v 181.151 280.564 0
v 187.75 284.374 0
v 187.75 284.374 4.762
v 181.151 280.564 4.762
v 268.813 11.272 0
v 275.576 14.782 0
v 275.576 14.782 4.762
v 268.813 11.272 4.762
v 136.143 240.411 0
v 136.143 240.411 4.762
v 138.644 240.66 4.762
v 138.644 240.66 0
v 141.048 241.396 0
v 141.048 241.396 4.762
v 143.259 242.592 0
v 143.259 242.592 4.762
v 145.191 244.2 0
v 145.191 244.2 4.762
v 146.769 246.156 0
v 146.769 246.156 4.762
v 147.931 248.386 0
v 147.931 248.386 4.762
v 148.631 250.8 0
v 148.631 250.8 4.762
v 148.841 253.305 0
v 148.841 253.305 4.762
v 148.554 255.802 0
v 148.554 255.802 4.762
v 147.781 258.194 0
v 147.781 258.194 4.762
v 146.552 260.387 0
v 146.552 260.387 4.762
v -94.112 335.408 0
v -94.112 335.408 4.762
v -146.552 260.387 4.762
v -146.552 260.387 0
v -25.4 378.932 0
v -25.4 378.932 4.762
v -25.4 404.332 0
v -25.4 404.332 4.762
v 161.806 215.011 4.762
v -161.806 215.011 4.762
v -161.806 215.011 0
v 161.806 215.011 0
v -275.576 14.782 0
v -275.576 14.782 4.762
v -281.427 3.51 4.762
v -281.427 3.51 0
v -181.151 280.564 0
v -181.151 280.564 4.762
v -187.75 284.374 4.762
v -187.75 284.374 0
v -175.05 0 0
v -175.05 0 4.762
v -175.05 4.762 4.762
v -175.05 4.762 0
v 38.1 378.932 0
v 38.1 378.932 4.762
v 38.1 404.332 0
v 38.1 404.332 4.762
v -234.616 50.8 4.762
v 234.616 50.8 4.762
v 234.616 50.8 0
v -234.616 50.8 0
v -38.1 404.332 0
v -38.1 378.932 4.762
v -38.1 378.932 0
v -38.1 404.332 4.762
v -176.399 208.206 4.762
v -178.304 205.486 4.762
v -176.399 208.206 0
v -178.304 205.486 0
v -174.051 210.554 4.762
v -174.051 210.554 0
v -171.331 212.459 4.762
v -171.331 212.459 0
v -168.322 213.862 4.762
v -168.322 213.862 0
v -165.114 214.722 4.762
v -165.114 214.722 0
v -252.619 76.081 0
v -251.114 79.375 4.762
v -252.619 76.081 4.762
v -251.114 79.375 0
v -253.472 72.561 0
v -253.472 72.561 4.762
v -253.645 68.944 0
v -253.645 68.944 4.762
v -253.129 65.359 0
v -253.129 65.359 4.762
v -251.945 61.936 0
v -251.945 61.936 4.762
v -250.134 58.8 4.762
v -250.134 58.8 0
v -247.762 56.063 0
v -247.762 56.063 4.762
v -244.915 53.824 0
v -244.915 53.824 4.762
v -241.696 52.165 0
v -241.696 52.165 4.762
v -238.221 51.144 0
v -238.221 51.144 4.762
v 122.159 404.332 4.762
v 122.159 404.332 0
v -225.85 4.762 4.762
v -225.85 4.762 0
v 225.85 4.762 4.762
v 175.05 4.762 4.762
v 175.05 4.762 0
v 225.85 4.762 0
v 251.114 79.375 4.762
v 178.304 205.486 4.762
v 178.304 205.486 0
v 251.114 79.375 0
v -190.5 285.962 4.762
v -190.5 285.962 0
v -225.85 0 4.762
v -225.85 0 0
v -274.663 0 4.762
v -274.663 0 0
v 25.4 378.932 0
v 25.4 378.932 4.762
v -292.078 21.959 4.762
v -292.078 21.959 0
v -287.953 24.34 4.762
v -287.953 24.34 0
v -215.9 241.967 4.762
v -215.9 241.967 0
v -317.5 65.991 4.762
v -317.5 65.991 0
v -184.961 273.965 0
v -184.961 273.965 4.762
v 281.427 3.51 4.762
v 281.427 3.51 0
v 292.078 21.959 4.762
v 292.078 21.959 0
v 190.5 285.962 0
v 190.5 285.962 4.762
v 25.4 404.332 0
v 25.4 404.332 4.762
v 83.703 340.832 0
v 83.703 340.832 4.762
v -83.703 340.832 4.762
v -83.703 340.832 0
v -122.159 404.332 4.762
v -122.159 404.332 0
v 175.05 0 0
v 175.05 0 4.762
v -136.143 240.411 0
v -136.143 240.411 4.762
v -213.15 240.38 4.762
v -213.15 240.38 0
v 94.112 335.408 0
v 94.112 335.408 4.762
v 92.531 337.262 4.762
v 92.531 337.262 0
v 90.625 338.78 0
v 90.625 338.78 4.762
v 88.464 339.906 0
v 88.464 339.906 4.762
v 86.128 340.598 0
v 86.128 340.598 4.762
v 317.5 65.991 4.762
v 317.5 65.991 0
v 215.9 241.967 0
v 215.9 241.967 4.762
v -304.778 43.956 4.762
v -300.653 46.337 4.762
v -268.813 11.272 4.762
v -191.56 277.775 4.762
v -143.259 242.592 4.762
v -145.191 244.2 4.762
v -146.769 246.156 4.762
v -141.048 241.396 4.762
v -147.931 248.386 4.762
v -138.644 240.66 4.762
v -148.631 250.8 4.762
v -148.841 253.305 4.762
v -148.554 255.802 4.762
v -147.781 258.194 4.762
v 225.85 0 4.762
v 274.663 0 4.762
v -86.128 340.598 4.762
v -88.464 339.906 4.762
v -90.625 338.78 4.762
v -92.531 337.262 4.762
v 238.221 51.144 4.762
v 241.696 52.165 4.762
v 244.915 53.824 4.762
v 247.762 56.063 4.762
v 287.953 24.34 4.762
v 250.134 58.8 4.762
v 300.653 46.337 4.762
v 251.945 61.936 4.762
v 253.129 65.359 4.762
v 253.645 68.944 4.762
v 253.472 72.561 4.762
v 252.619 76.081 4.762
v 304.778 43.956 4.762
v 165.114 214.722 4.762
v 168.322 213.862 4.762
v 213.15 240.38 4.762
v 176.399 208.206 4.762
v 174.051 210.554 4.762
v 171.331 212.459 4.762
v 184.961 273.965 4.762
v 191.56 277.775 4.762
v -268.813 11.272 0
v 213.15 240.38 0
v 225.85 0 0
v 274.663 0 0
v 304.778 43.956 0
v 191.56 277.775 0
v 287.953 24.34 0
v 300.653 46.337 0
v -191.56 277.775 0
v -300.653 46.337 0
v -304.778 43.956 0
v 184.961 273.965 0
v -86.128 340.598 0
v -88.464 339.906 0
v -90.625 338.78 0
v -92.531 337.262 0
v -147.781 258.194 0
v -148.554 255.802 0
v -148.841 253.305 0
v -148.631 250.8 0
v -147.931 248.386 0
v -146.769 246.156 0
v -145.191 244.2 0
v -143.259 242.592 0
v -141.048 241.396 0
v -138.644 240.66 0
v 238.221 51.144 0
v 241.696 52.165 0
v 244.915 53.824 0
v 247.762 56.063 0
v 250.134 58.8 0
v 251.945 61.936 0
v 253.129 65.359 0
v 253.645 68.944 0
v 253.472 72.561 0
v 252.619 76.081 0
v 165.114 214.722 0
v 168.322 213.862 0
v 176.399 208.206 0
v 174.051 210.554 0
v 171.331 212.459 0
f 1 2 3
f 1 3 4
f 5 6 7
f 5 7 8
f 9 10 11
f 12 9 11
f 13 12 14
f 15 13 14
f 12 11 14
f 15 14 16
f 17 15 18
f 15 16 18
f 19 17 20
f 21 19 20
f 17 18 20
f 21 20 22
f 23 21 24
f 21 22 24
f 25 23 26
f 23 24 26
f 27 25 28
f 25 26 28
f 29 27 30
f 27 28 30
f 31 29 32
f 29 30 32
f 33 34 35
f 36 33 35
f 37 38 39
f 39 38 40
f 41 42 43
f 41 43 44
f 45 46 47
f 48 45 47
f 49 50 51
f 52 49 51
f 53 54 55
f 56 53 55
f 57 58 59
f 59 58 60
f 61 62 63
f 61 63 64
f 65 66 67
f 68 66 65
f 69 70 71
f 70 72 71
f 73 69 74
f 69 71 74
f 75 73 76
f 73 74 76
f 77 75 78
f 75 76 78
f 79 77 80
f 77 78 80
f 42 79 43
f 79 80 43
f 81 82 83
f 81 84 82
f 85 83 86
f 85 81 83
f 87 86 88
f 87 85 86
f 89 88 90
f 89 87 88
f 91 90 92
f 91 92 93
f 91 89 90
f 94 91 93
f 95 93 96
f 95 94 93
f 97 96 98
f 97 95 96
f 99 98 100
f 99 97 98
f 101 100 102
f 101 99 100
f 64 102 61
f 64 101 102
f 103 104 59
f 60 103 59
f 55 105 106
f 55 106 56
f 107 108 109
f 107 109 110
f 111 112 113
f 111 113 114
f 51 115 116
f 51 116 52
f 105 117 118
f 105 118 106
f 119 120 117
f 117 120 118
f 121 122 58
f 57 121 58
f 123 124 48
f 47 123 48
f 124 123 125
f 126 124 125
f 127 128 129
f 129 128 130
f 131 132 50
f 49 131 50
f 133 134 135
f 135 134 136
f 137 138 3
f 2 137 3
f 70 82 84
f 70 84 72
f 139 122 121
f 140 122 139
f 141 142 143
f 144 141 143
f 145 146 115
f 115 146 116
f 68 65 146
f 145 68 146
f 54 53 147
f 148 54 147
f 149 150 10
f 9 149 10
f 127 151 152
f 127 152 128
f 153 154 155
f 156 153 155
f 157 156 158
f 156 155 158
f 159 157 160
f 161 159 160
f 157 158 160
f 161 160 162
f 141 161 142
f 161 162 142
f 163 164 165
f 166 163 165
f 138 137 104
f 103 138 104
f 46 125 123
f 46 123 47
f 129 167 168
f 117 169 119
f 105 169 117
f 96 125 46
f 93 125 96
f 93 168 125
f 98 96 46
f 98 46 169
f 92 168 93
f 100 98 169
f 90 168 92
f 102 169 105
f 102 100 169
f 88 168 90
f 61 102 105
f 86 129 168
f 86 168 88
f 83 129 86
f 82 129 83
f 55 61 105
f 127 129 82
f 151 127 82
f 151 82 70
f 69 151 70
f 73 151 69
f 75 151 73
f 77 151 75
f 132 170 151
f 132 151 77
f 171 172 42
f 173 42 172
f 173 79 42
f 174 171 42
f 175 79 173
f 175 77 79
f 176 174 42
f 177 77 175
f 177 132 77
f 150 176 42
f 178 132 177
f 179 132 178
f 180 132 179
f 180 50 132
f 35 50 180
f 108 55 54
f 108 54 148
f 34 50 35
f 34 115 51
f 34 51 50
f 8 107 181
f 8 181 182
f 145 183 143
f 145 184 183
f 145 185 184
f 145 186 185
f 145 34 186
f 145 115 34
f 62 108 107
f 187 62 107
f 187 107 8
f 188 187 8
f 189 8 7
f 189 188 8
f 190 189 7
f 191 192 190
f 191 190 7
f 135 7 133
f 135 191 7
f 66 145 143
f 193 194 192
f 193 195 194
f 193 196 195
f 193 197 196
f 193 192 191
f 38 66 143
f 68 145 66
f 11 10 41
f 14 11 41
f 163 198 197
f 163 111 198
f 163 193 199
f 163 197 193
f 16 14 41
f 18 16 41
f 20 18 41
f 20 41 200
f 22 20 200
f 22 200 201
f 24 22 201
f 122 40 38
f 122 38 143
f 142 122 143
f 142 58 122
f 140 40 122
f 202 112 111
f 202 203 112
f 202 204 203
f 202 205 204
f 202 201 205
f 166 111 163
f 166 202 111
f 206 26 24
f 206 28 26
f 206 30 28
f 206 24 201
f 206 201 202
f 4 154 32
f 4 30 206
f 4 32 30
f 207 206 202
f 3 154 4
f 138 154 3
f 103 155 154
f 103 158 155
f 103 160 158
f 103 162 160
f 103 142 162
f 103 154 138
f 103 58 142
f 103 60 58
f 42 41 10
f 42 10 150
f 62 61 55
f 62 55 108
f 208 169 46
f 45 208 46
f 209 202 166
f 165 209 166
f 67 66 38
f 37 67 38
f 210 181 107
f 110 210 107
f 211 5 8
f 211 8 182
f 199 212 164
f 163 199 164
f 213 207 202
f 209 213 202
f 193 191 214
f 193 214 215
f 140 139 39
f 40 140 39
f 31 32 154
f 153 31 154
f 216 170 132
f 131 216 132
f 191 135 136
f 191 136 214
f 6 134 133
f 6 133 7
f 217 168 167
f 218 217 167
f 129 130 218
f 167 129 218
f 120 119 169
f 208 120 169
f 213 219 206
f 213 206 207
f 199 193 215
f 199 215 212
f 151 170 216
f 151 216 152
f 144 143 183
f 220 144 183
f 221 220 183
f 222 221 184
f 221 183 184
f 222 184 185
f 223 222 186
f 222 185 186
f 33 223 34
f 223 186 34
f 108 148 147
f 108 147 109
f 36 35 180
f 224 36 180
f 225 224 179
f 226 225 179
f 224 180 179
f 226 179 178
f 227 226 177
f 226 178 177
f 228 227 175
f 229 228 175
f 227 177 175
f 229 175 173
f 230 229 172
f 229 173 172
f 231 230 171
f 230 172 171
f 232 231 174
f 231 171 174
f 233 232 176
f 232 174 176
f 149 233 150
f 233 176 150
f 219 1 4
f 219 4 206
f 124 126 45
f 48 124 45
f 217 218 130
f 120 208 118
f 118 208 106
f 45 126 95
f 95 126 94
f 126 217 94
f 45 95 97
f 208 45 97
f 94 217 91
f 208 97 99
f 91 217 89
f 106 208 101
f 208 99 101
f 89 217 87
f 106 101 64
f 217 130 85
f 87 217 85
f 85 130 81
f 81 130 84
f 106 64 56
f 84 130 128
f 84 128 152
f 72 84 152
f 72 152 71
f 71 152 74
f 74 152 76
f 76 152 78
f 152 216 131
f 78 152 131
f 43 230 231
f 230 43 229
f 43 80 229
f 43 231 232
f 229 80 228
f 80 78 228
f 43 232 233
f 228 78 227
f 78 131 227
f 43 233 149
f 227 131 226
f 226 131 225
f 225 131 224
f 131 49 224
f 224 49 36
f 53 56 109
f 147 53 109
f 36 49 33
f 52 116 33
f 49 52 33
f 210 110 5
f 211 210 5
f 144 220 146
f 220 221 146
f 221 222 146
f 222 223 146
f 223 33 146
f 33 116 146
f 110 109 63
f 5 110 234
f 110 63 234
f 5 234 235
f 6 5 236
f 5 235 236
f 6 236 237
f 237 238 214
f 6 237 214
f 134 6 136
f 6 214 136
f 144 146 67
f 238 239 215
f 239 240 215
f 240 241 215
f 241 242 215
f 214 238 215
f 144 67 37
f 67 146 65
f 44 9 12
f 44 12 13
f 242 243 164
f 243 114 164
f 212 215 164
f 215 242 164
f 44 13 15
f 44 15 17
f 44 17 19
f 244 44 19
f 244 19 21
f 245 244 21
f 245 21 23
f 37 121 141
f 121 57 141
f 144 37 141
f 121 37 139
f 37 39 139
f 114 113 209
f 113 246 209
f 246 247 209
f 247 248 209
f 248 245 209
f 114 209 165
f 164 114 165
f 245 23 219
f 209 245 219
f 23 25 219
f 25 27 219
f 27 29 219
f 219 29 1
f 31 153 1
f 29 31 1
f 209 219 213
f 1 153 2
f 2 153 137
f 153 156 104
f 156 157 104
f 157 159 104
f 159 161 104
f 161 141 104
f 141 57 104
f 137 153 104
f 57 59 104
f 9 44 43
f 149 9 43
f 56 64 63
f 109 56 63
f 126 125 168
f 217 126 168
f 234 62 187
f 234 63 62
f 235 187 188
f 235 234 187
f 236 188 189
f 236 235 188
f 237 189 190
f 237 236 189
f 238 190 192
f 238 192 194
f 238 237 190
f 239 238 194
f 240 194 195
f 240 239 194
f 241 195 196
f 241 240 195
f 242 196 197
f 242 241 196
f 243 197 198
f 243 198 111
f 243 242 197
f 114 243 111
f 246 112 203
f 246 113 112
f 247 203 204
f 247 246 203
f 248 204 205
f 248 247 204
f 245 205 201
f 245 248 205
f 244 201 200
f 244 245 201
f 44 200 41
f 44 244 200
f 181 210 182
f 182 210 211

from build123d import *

# Parameters (mm, degrees)
BOSS_EXTRUDE1_DEPTH = 4.7625
CUT_EXTRUDE5_DEPTH  = 515.11412225
CUT_EXTRUDE15_DEPTH = 4.7625
FILLET1_R           = 19.05
CUT_EXTRUDE9_DEPTH  = 515.11412225
CUT_EXTRUDE10_DEPTH = 515.11412225
SKETCH4_W           = 50.8
SKETCH4_H           = 4.7625
CUT_EXTRUDE11_DEPTH = 515.11412225
SKETCH14_W          = 12.7
SKETCH14_H          = 25.4
CUT_EXTRUDE12_DEPTH = 515.11412225
CUT_EXTRUDE13_REACH = 516.114
CUT_EXTRUDE14_REACH = 516.114
MIRROR1_DEPTH       = 4.7625


# Read off the part's stored shape, not the designer's step: Mirror1
with BuildPart() as part:
    # Sketch3 → Boss-Extrude1 (new body)
    with BuildSketch(Plane.XY):
        Polygon((-317.5, 65.991135768), (-279.4, 0), (279.4, 0), (317.5, 65.991135768), (122.15878735, 404.332040891), (-122.15878735, 404.332040891), align=None)
    extrude(amount=BOSS_EXTRUDE1_DEPTH)

    # Sketch7 → Cut-Extrude5 (cut, through all)
    with BuildSketch(Plane.XY.offset(4.7625)):
        with BuildLine():
            Line((-136.142811828, 240.411), (136.142811828, 240.411))
            ThreePointArc((136.142811828, 240.411), (147.405476624, 247.242236784), (146.551931965, 260.387002884))
            Line((146.551931965, 260.387002884), (94.11202324, 335.408043775))
            ThreePointArc((94.11202324, 335.408043775), (89.571666319, 339.394705687), (83.702903103, 340.832040891))
            Line((83.702903103, 340.832040891), (-83.702903103, 340.832040891))
            ThreePointArc((-83.702903103, 340.832040891), (-89.571666319, 339.394705687), (-94.11202324, 335.408043775))
            Line((-94.11202324, 335.408043775), (-146.551931965, 260.387002884))
            ThreePointArc((-146.551931965, 260.387002884), (-147.405476624, 247.242236784), (-136.142811828, 240.411))
        make_face()
    extrude(amount=-CUT_EXTRUDE5_DEPTH, mode=Mode.SUBTRACT)

    # Sketch11 → Cut-Extrude15 (cut)
    with BuildSketch(Plane.XY.offset(4.7625)):
        Polygon((-172.804553922, 215.011), (172.804553922, 215.011), (267.611818975, 50.8), (-267.611818975, 50.8), align=None)
    extrude(amount=-CUT_EXTRUDE15_DEPTH, mode=Mode.SUBTRACT)

    # Fillet1
    fillet1_edges = [part.edges().sort_by_distance(p)[0] for p in [
        (172.804553922, 215.011, 2.38125),
        (-172.804553922, 215.011, 2.38125),
        (-267.611818975, 50.8, 2.38125),
        (267.611818975, 50.8, 2.38125),
    ]]
    fillet(fillet1_edges, radius=FILLET1_R)

    # Sketch12 → Cut-Extrude9 (cut, through all)
    with BuildSketch(Plane.XY.offset(4.7625)):
        Polygon((215.9, 241.967497817), (190.5, 285.96158833), (187.750369343, 284.37408833), (213.150369343, 240.379997817), align=None)
        Polygon((-187.750369343, 284.37408833), (-213.150369343, 240.379997817), (-215.9, 241.967497817), (-190.5, 285.96158833), align=None)
    extrude(amount=-CUT_EXTRUDE9_DEPTH, mode=Mode.SUBTRACT)

    # Sketch13 → Cut-Extrude10 (cut, through all)
    with BuildSketch(Plane.XY.offset(4.7625)):
        Polygon((292.077815329, 21.958620278), (287.953369343, 24.339870278), (300.653369343, 46.336915534), (304.777815329, 43.955665534), align=None)
        Polygon((-300.653369343, 46.336915534), (-304.777815329, 43.955665534), (-292.077815329, 21.958620278), (-287.953369343, 24.339870278), align=None)
    extrude(amount=-CUT_EXTRUDE10_DEPTH, mode=Mode.SUBTRACT)

    # Sketch4 → Cut-Extrude11 (cut, through all)
    with BuildSketch(Plane.XY.offset(4.7625)):
        with Locations((200.450369343, 2.38125)):
            Rectangle(SKETCH4_W, SKETCH4_H)
        with Locations((-200.450369343, 2.38125)):
            Rectangle(SKETCH4_W, SKETCH4_H)
    extrude(amount=-CUT_EXTRUDE11_DEPTH, mode=Mode.SUBTRACT)

    # Sketch14 → Cut-Extrude12 (cut, through all)
    with BuildSketch(Plane.XY.offset(4.7625)):
        with Locations((-31.75, 391.632040891)):
            Rectangle(SKETCH14_W, SKETCH14_H)
        with Locations((31.75, 391.632040891)):
            Rectangle(SKETCH14_W, SKETCH14_H)
    extrude(amount=-CUT_EXTRUDE12_DEPTH, mode=Mode.SUBTRACT)

    # Sketch15 → Cut-Extrude13 (cut, up to next)
    with BuildSketch(Plane.XY.offset(4.7625), mode=Mode.PRIVATE) as cut_extrude13_sk1:
        Polygon((-281.426680084, 3.510312876), (-274.663389205, 0), (-268.812867745, 11.272151465), (-275.576158624, 14.782464341), align=None)
    cut_extrude13_tool1 = extrude(cut_extrude13_sk1.sketch, amount=-CUT_EXTRUDE13_REACH, mode=Mode.PRIVATE) & part.part
    add(cut_extrude13_tool1.solids().sort_by_distance((-275.119774, 7.391232, 4.7625))[0], mode=Mode.SUBTRACT)


with BuildPart() as cut_extrude13_kept_piece:
    # of the separate pieces the step leaves, the one the design keeps (cut_extrude13_pieces_kept)
    add(part.part.solids().sort_by_distance((-122.15878735, 404.332040891, 0))[0])

    # Sketch16 → Cut-Extrude14 (cut, up to next)
    with BuildSketch(Plane.XY.offset(4.7625), mode=Mode.PRIVATE) as cut_extrude14_sk1:
        Polygon((-187.750369343, 284.37408833), (-191.560369343, 277.774974753), (-184.961255766, 273.964974753), (-181.151255766, 280.56408833), align=None)
    cut_extrude14_tool1 = extrude(cut_extrude14_sk1.sketch, amount=-CUT_EXTRUDE14_REACH, mode=Mode.PRIVATE) & cut_extrude13_kept_piece.part
    add(cut_extrude14_tool1.solids().sort_by_distance((-186.355813, 279.169532, 4.7625))[0], mode=Mode.SUBTRACT)

    # Mirror1 outline → Mirror1 (cut)
    with BuildSketch(Plane.XY):
        Polygon((191.560369343, 277.774974753), (187.750369343, 284.37408833), (181.151255766, 280.56408833), (184.961255766, 273.964974753), align=None)
        Polygon((281.426680084, 3.510312876), (275.576158624, 14.782464341), (268.812867745, 11.272151465), (274.663389205, 0), (279.4, 0), align=None)
    extrude(amount=MIRROR1_DEPTH, mode=Mode.SUBTRACT)


solid = cut_extrude13_kept_piece.part
